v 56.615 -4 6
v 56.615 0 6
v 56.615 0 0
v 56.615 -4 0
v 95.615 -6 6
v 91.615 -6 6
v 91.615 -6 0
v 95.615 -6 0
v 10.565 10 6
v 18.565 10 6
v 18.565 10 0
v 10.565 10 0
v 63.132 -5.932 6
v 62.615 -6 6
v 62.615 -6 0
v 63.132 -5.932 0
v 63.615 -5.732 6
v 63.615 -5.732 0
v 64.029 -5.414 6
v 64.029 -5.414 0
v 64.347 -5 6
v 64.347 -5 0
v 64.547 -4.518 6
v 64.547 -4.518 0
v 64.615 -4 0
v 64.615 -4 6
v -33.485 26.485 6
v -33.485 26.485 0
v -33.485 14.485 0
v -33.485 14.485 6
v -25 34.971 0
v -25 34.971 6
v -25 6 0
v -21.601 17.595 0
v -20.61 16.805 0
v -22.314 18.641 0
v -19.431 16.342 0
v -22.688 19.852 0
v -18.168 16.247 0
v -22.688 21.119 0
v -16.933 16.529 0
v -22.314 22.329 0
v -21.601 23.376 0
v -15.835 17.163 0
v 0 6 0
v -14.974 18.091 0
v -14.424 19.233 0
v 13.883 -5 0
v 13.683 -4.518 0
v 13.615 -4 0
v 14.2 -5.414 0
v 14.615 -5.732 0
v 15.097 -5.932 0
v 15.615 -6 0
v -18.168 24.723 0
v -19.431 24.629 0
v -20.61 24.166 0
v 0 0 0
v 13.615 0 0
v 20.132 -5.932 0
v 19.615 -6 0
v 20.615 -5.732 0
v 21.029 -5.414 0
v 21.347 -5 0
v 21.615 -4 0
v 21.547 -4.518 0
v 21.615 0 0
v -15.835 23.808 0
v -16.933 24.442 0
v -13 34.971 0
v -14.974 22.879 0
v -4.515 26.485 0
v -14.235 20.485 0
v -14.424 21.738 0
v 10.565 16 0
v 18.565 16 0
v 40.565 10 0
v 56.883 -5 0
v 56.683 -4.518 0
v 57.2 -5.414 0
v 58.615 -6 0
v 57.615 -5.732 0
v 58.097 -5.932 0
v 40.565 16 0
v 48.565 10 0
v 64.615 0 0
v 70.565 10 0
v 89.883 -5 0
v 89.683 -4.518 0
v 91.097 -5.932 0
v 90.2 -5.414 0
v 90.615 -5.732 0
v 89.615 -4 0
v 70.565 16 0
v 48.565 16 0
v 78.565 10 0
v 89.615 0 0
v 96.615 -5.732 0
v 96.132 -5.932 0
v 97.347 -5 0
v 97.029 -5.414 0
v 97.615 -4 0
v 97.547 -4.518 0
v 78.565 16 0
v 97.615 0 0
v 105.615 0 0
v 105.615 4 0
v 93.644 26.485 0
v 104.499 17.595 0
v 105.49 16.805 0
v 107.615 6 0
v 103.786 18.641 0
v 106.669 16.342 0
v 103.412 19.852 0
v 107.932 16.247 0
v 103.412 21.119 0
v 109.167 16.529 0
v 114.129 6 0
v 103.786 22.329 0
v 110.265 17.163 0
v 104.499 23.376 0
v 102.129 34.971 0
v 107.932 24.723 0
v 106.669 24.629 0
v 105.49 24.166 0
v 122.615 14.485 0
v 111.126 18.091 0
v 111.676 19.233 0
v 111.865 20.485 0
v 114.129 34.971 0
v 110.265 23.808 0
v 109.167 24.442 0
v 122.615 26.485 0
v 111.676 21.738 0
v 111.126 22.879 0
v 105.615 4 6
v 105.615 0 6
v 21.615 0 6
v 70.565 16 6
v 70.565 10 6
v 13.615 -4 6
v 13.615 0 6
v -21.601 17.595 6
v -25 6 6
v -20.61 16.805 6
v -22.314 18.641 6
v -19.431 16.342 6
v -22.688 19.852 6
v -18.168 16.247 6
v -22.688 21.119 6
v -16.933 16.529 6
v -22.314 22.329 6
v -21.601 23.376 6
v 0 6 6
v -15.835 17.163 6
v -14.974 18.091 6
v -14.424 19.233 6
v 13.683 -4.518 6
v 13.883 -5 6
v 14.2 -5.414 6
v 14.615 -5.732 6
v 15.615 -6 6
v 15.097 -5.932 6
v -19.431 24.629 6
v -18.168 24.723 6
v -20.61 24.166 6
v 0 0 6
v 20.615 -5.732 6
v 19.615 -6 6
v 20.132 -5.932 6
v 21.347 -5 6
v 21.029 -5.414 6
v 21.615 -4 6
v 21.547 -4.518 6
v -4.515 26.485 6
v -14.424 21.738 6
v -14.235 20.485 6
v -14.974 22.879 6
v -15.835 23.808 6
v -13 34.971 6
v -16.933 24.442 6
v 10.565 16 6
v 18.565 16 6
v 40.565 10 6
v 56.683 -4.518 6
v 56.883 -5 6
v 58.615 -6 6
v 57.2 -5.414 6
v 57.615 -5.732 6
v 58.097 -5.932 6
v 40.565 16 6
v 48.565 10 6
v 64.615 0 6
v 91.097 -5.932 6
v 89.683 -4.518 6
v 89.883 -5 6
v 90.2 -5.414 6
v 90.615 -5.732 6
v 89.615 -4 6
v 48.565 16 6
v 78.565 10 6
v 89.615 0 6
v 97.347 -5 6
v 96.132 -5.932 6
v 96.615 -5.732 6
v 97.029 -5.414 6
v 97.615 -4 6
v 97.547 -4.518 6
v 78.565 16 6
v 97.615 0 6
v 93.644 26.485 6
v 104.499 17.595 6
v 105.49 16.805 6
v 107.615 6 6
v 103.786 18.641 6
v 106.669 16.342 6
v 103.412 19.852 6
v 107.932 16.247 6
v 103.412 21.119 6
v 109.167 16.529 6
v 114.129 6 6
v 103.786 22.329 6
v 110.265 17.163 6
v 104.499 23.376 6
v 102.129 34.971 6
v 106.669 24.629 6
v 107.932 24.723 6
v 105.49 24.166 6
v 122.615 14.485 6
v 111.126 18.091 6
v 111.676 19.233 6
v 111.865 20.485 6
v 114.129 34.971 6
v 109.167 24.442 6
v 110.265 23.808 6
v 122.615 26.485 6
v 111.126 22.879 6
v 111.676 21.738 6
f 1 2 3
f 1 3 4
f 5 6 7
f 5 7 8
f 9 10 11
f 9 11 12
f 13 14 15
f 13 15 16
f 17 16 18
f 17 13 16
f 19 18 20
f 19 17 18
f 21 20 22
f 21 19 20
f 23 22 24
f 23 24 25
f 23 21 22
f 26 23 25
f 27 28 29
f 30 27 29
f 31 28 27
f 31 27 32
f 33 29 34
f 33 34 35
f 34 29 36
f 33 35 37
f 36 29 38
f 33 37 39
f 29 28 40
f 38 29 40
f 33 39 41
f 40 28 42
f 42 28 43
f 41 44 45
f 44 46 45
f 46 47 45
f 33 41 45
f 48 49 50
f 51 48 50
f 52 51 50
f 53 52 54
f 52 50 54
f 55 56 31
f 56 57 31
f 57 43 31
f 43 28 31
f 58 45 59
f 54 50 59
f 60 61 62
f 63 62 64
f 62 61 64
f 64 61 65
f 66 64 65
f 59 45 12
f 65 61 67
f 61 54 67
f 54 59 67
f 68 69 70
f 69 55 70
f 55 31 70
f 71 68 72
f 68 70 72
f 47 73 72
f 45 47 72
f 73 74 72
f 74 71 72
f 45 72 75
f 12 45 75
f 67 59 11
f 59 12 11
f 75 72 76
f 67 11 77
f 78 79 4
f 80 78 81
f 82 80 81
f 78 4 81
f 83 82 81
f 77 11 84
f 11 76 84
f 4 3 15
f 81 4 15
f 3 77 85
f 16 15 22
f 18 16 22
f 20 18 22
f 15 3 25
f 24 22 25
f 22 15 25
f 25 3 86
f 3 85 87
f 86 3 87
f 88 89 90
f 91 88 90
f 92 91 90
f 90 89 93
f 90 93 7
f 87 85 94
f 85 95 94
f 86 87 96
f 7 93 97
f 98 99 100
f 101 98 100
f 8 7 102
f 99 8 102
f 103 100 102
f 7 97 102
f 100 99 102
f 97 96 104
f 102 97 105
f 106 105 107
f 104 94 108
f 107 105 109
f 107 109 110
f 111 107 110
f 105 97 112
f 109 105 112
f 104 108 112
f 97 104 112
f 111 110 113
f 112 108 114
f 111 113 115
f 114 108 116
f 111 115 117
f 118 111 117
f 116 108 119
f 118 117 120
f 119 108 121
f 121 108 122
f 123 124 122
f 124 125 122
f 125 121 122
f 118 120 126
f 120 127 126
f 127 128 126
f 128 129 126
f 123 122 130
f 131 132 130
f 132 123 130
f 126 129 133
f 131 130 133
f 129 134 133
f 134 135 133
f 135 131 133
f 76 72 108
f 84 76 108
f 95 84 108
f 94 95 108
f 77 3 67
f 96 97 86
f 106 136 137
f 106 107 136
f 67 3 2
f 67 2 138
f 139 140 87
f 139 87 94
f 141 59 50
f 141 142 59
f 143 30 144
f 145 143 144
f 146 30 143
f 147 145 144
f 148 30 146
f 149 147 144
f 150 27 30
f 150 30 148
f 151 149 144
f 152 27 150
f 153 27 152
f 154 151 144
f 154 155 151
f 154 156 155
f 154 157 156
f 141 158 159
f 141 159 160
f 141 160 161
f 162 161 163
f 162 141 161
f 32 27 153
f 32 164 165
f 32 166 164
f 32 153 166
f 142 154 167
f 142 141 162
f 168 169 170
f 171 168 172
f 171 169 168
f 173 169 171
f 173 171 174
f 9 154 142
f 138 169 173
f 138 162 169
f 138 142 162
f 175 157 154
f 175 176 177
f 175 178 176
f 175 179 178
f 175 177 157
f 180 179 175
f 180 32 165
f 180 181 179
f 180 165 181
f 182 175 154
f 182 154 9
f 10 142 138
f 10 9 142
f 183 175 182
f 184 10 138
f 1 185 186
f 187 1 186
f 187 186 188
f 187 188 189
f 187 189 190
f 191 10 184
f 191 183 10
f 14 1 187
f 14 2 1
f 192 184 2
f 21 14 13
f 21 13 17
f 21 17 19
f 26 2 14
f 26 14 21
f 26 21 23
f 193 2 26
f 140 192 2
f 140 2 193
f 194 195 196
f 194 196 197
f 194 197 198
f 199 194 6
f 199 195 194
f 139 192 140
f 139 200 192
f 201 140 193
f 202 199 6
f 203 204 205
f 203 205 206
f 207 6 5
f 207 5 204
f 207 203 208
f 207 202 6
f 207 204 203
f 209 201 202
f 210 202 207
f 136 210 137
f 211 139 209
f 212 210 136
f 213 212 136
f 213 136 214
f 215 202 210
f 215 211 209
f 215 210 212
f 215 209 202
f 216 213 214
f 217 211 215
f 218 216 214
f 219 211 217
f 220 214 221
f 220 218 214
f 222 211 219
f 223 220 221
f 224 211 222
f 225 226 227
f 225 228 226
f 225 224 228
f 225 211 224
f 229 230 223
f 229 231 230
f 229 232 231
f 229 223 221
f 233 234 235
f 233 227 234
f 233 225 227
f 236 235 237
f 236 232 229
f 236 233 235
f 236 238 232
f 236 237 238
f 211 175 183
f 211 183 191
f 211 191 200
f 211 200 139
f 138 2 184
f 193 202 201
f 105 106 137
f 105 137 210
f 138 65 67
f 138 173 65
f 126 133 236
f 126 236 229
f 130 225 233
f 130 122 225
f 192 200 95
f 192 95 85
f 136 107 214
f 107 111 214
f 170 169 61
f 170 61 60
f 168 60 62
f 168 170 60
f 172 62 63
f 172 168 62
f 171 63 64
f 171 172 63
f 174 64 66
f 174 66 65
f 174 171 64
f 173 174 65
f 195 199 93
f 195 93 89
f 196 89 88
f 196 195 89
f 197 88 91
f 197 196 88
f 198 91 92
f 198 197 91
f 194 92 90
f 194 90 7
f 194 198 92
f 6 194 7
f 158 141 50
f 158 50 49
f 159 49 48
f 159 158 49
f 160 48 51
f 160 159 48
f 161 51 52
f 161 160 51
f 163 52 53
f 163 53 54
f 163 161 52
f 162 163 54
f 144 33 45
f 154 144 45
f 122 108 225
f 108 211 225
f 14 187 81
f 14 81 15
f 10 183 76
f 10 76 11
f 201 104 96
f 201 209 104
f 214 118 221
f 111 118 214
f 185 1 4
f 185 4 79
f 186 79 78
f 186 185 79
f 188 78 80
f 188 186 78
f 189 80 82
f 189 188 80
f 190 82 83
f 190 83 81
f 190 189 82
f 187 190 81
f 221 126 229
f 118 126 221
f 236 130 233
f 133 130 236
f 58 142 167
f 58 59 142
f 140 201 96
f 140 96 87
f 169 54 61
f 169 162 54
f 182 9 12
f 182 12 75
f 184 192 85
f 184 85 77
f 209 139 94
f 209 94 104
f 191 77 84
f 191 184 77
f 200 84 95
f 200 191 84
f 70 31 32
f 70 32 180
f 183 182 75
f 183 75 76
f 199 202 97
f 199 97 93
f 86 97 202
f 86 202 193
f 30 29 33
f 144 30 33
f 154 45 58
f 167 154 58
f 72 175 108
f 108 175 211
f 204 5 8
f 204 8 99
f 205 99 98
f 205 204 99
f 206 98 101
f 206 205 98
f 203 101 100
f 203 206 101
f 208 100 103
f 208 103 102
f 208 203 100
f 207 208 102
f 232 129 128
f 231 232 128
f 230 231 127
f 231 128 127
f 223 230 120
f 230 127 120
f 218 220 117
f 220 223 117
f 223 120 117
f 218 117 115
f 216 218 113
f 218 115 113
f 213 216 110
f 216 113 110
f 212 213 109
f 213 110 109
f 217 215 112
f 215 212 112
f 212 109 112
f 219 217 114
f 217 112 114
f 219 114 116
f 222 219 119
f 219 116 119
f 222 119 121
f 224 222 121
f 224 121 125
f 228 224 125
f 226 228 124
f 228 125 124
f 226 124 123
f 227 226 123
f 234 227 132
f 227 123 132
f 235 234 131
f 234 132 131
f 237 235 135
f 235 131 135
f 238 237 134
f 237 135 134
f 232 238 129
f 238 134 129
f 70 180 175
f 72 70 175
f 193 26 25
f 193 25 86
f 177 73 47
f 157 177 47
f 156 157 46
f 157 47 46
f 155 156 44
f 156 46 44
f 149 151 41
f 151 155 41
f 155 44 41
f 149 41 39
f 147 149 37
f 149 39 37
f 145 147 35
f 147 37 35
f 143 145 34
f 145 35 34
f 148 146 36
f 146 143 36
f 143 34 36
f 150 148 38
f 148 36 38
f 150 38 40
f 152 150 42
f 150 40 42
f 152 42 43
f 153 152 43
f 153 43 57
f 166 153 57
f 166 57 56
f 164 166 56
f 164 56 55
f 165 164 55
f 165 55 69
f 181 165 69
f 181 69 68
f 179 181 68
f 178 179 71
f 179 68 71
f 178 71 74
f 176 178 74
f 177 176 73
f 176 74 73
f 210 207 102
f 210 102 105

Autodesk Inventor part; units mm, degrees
ref_plane "YZ Plane" through (0, 0, 0) normal (1, 0, 0) x (0, 1, 0)
ref_plane "XZ Plane" through (0, 0, 0) normal (0, 1, 0) x (-1, 0, 0)
ref_plane "XY Plane" through (0, 0, 0) normal (0, 0, 1) x (1, 0, 0)
sketch "Sketch1" plane through (0, 0, 0) normal (0, 0, 1) x (1, 0, 0)
  circle A0 centre (-18.4853, 20.4853) radius 4.25
  circle A1 centre (107.6147, 20.4853) radius 4.25
  line L0 (-33.4853, 26.4853) -> (-33.4853, 14.4853)
  line L1 (-33.4853, 26.4853) -> (-25, 34.9706)
  line L2 (-33.4853, 14.4853) -> (-25, 6)
  line L3 (-25, 34.9706) -> (114.1294, 34.9706)
  line L4 (114.1294, 34.9706) -> (122.6147, 26.4853)
  line L5 (122.6147, 26.4853) -> (122.6147, 14.4853)
  line L6 (122.6147, 14.4853) -> (114.1294, 6)
  circle A2 centre (-18.4853, 20.4853) radius 13 construction
  circle A3 centre (-18.4853, 20.4853) radius 17 construction
  line L7 (-25, 6) -> (0, 6)
  line L8 (0, 6) -> (0, 0)
  line L9 (114.1294, 6) -> (105.6147, 6)
  line L10 (105.6147, 6) -> (105.6147, 0)
  line L11 (105.6147, 0) -> (0, 0)
  point P0 (0, 0)
  point P1 (-33.4853, 20.4853)
  dimension "d0" = 8.5
  dimension "d1" = 126.1
  dimension "d2" = 45
  dimension "d3" = 12
  dimension "d4" = 26
  dimension "d5" = 34
  dimension "d6" = 15
  dimension "d7" = 6
  dimension "d10" = 15
  dimension "d18" = 2
  dimension "d19" = 25
extrude "Extrusion1" add sketch "Sketch1" along normal blind 6
sketch "Sketch2" plane through (0, 0, 6) normal (0, 0, 1) x (1, 0, 0)
  line L0 (114.1294, 34.9706) -> (-25, 34.9706) projected
  line L1 (-25, 34.9706) -> (-33.4853, 26.4853) projected
  line L2 (-13, 34.9706) -> (-4.5147, 26.4853)
  line L3 (-4.5147, 26.4853) -> (93.6442, 26.4853)
  line L4 (93.6442, 26.4853) -> (102.1294, 34.9706)
  point P0 (-33.4853, 14.4853)
  dimension "d13" = 12
  dimension "d14" = 12
  dimension "d15" = 12
extrude "Extrusion2" cut sketch "Sketch2" against normal blind 6
sketch "Sketch3" plane through (0, 0, 6) normal (0, 0, 1) x (1, 0, 0)
  line L0 (0, 0) -> (105.6147, 0) projected
  line L1 (93.6442, 26.4853) -> (-4.5147, 26.4853) projected
  line L2 (40.5647, 16) -> (48.5647, 16)
  line L3 (48.5647, 16) -> (48.5647, 10)
  line L4 (48.5647, 10) -> (40.5647, 10)
  line L5 (40.5647, 10) -> (40.5647, 16)
  line L6 (10.5647, 16) -> (18.5647, 16)
  line L7 (18.5647, 16) -> (18.5647, 10)
  line L8 (18.5647, 10) -> (10.5647, 10)
  line L9 (10.5647, 10) -> (10.5647, 16)
  line L10 (70.5647, 16) -> (78.5647, 16)
  line L11 (78.5647, 16) -> (78.5647, 10)
  line L12 (78.5647, 10) -> (70.5647, 10)
  line L13 (70.5647, 10) -> (70.5647, 16)
  point P0 (44.5647, 16)
  point P1 (44.5647, 26.4853)
  dimension "d20" = 8
  dimension "d21" = 6
  dimension "d22" = 8
  dimension "d23" = 8
  dimension "d24" = 10
  dimension "d25" = 22
  dimension "d26" = 22
extrude "Extrusion3" cut sketch "Sketch3" against normal through all
sketch "Sketch4" plane through (0, 0, 6) normal (0, 0, 1) x (1, 0, 0)
  line L0 (0, 0) -> (105.6147, 0) projected
  line L1 (97.6147, 0) -> (89.6147, 0)
  line L2 (89.6147, 0) -> (89.6147, -4)
  line L3 (91.6147, -6) -> (95.6147, -6)
  line L4 (97.6147, -4) -> (97.6147, 0)
  line L5 (64.6147, 0) -> (56.6147, 0)
  line L6 (56.6147, 0) -> (56.6147, -4)
  line L7 (58.6147, -6) -> (62.6147, -6)
  line L8 (64.6147, -4) -> (64.6147, 0)
  line L9 (21.6147, 0) -> (13.6147, 0)
  line L10 (13.6147, 0) -> (13.6147, -4)
  line L11 (15.6147, -6) -> (19.6147, -6)
  line L12 (21.6147, -4) -> (21.6147, 0)
  arc A0 (13.6147, -4) -> (15.6147, -6) centre (15.6147, -4) ccw
  arc A1 (19.6147, -6) -> (21.6147, -4) centre (19.6147, -4) ccw
  arc A2 (56.6147, -4) -> (58.6147, -6) centre (58.6147, -4) ccw
  arc A3 (62.6147, -6) -> (64.6147, -4) centre (62.6147, -4) ccw
  arc A4 (89.6147, -4) -> (91.6147, -6) centre (91.6147, -4) ccw
  arc A5 (95.6147, -6) -> (97.6147, -4) centre (95.6147, -4) ccw
  dimension "d29" = 2
  dimension "d30" = 8
  dimension "d31" = 8
  dimension "d32" = 8
  dimension "d33" = 6
  dimension "d34" = 8
  dimension "d35" = 25
  dimension "d36" = 35
extrude "Extrusion4" add sketch "Sketch4" against normal blind 6
chamfer "Chamfer1" distance 2 angle 45 1 edges at (105.6147, 6, 3)
equation "\"d14\" = d13"
equation "\"d15\" = d14"
equation "\"d26\" = d25"
properties part number "rope_mount_a"
